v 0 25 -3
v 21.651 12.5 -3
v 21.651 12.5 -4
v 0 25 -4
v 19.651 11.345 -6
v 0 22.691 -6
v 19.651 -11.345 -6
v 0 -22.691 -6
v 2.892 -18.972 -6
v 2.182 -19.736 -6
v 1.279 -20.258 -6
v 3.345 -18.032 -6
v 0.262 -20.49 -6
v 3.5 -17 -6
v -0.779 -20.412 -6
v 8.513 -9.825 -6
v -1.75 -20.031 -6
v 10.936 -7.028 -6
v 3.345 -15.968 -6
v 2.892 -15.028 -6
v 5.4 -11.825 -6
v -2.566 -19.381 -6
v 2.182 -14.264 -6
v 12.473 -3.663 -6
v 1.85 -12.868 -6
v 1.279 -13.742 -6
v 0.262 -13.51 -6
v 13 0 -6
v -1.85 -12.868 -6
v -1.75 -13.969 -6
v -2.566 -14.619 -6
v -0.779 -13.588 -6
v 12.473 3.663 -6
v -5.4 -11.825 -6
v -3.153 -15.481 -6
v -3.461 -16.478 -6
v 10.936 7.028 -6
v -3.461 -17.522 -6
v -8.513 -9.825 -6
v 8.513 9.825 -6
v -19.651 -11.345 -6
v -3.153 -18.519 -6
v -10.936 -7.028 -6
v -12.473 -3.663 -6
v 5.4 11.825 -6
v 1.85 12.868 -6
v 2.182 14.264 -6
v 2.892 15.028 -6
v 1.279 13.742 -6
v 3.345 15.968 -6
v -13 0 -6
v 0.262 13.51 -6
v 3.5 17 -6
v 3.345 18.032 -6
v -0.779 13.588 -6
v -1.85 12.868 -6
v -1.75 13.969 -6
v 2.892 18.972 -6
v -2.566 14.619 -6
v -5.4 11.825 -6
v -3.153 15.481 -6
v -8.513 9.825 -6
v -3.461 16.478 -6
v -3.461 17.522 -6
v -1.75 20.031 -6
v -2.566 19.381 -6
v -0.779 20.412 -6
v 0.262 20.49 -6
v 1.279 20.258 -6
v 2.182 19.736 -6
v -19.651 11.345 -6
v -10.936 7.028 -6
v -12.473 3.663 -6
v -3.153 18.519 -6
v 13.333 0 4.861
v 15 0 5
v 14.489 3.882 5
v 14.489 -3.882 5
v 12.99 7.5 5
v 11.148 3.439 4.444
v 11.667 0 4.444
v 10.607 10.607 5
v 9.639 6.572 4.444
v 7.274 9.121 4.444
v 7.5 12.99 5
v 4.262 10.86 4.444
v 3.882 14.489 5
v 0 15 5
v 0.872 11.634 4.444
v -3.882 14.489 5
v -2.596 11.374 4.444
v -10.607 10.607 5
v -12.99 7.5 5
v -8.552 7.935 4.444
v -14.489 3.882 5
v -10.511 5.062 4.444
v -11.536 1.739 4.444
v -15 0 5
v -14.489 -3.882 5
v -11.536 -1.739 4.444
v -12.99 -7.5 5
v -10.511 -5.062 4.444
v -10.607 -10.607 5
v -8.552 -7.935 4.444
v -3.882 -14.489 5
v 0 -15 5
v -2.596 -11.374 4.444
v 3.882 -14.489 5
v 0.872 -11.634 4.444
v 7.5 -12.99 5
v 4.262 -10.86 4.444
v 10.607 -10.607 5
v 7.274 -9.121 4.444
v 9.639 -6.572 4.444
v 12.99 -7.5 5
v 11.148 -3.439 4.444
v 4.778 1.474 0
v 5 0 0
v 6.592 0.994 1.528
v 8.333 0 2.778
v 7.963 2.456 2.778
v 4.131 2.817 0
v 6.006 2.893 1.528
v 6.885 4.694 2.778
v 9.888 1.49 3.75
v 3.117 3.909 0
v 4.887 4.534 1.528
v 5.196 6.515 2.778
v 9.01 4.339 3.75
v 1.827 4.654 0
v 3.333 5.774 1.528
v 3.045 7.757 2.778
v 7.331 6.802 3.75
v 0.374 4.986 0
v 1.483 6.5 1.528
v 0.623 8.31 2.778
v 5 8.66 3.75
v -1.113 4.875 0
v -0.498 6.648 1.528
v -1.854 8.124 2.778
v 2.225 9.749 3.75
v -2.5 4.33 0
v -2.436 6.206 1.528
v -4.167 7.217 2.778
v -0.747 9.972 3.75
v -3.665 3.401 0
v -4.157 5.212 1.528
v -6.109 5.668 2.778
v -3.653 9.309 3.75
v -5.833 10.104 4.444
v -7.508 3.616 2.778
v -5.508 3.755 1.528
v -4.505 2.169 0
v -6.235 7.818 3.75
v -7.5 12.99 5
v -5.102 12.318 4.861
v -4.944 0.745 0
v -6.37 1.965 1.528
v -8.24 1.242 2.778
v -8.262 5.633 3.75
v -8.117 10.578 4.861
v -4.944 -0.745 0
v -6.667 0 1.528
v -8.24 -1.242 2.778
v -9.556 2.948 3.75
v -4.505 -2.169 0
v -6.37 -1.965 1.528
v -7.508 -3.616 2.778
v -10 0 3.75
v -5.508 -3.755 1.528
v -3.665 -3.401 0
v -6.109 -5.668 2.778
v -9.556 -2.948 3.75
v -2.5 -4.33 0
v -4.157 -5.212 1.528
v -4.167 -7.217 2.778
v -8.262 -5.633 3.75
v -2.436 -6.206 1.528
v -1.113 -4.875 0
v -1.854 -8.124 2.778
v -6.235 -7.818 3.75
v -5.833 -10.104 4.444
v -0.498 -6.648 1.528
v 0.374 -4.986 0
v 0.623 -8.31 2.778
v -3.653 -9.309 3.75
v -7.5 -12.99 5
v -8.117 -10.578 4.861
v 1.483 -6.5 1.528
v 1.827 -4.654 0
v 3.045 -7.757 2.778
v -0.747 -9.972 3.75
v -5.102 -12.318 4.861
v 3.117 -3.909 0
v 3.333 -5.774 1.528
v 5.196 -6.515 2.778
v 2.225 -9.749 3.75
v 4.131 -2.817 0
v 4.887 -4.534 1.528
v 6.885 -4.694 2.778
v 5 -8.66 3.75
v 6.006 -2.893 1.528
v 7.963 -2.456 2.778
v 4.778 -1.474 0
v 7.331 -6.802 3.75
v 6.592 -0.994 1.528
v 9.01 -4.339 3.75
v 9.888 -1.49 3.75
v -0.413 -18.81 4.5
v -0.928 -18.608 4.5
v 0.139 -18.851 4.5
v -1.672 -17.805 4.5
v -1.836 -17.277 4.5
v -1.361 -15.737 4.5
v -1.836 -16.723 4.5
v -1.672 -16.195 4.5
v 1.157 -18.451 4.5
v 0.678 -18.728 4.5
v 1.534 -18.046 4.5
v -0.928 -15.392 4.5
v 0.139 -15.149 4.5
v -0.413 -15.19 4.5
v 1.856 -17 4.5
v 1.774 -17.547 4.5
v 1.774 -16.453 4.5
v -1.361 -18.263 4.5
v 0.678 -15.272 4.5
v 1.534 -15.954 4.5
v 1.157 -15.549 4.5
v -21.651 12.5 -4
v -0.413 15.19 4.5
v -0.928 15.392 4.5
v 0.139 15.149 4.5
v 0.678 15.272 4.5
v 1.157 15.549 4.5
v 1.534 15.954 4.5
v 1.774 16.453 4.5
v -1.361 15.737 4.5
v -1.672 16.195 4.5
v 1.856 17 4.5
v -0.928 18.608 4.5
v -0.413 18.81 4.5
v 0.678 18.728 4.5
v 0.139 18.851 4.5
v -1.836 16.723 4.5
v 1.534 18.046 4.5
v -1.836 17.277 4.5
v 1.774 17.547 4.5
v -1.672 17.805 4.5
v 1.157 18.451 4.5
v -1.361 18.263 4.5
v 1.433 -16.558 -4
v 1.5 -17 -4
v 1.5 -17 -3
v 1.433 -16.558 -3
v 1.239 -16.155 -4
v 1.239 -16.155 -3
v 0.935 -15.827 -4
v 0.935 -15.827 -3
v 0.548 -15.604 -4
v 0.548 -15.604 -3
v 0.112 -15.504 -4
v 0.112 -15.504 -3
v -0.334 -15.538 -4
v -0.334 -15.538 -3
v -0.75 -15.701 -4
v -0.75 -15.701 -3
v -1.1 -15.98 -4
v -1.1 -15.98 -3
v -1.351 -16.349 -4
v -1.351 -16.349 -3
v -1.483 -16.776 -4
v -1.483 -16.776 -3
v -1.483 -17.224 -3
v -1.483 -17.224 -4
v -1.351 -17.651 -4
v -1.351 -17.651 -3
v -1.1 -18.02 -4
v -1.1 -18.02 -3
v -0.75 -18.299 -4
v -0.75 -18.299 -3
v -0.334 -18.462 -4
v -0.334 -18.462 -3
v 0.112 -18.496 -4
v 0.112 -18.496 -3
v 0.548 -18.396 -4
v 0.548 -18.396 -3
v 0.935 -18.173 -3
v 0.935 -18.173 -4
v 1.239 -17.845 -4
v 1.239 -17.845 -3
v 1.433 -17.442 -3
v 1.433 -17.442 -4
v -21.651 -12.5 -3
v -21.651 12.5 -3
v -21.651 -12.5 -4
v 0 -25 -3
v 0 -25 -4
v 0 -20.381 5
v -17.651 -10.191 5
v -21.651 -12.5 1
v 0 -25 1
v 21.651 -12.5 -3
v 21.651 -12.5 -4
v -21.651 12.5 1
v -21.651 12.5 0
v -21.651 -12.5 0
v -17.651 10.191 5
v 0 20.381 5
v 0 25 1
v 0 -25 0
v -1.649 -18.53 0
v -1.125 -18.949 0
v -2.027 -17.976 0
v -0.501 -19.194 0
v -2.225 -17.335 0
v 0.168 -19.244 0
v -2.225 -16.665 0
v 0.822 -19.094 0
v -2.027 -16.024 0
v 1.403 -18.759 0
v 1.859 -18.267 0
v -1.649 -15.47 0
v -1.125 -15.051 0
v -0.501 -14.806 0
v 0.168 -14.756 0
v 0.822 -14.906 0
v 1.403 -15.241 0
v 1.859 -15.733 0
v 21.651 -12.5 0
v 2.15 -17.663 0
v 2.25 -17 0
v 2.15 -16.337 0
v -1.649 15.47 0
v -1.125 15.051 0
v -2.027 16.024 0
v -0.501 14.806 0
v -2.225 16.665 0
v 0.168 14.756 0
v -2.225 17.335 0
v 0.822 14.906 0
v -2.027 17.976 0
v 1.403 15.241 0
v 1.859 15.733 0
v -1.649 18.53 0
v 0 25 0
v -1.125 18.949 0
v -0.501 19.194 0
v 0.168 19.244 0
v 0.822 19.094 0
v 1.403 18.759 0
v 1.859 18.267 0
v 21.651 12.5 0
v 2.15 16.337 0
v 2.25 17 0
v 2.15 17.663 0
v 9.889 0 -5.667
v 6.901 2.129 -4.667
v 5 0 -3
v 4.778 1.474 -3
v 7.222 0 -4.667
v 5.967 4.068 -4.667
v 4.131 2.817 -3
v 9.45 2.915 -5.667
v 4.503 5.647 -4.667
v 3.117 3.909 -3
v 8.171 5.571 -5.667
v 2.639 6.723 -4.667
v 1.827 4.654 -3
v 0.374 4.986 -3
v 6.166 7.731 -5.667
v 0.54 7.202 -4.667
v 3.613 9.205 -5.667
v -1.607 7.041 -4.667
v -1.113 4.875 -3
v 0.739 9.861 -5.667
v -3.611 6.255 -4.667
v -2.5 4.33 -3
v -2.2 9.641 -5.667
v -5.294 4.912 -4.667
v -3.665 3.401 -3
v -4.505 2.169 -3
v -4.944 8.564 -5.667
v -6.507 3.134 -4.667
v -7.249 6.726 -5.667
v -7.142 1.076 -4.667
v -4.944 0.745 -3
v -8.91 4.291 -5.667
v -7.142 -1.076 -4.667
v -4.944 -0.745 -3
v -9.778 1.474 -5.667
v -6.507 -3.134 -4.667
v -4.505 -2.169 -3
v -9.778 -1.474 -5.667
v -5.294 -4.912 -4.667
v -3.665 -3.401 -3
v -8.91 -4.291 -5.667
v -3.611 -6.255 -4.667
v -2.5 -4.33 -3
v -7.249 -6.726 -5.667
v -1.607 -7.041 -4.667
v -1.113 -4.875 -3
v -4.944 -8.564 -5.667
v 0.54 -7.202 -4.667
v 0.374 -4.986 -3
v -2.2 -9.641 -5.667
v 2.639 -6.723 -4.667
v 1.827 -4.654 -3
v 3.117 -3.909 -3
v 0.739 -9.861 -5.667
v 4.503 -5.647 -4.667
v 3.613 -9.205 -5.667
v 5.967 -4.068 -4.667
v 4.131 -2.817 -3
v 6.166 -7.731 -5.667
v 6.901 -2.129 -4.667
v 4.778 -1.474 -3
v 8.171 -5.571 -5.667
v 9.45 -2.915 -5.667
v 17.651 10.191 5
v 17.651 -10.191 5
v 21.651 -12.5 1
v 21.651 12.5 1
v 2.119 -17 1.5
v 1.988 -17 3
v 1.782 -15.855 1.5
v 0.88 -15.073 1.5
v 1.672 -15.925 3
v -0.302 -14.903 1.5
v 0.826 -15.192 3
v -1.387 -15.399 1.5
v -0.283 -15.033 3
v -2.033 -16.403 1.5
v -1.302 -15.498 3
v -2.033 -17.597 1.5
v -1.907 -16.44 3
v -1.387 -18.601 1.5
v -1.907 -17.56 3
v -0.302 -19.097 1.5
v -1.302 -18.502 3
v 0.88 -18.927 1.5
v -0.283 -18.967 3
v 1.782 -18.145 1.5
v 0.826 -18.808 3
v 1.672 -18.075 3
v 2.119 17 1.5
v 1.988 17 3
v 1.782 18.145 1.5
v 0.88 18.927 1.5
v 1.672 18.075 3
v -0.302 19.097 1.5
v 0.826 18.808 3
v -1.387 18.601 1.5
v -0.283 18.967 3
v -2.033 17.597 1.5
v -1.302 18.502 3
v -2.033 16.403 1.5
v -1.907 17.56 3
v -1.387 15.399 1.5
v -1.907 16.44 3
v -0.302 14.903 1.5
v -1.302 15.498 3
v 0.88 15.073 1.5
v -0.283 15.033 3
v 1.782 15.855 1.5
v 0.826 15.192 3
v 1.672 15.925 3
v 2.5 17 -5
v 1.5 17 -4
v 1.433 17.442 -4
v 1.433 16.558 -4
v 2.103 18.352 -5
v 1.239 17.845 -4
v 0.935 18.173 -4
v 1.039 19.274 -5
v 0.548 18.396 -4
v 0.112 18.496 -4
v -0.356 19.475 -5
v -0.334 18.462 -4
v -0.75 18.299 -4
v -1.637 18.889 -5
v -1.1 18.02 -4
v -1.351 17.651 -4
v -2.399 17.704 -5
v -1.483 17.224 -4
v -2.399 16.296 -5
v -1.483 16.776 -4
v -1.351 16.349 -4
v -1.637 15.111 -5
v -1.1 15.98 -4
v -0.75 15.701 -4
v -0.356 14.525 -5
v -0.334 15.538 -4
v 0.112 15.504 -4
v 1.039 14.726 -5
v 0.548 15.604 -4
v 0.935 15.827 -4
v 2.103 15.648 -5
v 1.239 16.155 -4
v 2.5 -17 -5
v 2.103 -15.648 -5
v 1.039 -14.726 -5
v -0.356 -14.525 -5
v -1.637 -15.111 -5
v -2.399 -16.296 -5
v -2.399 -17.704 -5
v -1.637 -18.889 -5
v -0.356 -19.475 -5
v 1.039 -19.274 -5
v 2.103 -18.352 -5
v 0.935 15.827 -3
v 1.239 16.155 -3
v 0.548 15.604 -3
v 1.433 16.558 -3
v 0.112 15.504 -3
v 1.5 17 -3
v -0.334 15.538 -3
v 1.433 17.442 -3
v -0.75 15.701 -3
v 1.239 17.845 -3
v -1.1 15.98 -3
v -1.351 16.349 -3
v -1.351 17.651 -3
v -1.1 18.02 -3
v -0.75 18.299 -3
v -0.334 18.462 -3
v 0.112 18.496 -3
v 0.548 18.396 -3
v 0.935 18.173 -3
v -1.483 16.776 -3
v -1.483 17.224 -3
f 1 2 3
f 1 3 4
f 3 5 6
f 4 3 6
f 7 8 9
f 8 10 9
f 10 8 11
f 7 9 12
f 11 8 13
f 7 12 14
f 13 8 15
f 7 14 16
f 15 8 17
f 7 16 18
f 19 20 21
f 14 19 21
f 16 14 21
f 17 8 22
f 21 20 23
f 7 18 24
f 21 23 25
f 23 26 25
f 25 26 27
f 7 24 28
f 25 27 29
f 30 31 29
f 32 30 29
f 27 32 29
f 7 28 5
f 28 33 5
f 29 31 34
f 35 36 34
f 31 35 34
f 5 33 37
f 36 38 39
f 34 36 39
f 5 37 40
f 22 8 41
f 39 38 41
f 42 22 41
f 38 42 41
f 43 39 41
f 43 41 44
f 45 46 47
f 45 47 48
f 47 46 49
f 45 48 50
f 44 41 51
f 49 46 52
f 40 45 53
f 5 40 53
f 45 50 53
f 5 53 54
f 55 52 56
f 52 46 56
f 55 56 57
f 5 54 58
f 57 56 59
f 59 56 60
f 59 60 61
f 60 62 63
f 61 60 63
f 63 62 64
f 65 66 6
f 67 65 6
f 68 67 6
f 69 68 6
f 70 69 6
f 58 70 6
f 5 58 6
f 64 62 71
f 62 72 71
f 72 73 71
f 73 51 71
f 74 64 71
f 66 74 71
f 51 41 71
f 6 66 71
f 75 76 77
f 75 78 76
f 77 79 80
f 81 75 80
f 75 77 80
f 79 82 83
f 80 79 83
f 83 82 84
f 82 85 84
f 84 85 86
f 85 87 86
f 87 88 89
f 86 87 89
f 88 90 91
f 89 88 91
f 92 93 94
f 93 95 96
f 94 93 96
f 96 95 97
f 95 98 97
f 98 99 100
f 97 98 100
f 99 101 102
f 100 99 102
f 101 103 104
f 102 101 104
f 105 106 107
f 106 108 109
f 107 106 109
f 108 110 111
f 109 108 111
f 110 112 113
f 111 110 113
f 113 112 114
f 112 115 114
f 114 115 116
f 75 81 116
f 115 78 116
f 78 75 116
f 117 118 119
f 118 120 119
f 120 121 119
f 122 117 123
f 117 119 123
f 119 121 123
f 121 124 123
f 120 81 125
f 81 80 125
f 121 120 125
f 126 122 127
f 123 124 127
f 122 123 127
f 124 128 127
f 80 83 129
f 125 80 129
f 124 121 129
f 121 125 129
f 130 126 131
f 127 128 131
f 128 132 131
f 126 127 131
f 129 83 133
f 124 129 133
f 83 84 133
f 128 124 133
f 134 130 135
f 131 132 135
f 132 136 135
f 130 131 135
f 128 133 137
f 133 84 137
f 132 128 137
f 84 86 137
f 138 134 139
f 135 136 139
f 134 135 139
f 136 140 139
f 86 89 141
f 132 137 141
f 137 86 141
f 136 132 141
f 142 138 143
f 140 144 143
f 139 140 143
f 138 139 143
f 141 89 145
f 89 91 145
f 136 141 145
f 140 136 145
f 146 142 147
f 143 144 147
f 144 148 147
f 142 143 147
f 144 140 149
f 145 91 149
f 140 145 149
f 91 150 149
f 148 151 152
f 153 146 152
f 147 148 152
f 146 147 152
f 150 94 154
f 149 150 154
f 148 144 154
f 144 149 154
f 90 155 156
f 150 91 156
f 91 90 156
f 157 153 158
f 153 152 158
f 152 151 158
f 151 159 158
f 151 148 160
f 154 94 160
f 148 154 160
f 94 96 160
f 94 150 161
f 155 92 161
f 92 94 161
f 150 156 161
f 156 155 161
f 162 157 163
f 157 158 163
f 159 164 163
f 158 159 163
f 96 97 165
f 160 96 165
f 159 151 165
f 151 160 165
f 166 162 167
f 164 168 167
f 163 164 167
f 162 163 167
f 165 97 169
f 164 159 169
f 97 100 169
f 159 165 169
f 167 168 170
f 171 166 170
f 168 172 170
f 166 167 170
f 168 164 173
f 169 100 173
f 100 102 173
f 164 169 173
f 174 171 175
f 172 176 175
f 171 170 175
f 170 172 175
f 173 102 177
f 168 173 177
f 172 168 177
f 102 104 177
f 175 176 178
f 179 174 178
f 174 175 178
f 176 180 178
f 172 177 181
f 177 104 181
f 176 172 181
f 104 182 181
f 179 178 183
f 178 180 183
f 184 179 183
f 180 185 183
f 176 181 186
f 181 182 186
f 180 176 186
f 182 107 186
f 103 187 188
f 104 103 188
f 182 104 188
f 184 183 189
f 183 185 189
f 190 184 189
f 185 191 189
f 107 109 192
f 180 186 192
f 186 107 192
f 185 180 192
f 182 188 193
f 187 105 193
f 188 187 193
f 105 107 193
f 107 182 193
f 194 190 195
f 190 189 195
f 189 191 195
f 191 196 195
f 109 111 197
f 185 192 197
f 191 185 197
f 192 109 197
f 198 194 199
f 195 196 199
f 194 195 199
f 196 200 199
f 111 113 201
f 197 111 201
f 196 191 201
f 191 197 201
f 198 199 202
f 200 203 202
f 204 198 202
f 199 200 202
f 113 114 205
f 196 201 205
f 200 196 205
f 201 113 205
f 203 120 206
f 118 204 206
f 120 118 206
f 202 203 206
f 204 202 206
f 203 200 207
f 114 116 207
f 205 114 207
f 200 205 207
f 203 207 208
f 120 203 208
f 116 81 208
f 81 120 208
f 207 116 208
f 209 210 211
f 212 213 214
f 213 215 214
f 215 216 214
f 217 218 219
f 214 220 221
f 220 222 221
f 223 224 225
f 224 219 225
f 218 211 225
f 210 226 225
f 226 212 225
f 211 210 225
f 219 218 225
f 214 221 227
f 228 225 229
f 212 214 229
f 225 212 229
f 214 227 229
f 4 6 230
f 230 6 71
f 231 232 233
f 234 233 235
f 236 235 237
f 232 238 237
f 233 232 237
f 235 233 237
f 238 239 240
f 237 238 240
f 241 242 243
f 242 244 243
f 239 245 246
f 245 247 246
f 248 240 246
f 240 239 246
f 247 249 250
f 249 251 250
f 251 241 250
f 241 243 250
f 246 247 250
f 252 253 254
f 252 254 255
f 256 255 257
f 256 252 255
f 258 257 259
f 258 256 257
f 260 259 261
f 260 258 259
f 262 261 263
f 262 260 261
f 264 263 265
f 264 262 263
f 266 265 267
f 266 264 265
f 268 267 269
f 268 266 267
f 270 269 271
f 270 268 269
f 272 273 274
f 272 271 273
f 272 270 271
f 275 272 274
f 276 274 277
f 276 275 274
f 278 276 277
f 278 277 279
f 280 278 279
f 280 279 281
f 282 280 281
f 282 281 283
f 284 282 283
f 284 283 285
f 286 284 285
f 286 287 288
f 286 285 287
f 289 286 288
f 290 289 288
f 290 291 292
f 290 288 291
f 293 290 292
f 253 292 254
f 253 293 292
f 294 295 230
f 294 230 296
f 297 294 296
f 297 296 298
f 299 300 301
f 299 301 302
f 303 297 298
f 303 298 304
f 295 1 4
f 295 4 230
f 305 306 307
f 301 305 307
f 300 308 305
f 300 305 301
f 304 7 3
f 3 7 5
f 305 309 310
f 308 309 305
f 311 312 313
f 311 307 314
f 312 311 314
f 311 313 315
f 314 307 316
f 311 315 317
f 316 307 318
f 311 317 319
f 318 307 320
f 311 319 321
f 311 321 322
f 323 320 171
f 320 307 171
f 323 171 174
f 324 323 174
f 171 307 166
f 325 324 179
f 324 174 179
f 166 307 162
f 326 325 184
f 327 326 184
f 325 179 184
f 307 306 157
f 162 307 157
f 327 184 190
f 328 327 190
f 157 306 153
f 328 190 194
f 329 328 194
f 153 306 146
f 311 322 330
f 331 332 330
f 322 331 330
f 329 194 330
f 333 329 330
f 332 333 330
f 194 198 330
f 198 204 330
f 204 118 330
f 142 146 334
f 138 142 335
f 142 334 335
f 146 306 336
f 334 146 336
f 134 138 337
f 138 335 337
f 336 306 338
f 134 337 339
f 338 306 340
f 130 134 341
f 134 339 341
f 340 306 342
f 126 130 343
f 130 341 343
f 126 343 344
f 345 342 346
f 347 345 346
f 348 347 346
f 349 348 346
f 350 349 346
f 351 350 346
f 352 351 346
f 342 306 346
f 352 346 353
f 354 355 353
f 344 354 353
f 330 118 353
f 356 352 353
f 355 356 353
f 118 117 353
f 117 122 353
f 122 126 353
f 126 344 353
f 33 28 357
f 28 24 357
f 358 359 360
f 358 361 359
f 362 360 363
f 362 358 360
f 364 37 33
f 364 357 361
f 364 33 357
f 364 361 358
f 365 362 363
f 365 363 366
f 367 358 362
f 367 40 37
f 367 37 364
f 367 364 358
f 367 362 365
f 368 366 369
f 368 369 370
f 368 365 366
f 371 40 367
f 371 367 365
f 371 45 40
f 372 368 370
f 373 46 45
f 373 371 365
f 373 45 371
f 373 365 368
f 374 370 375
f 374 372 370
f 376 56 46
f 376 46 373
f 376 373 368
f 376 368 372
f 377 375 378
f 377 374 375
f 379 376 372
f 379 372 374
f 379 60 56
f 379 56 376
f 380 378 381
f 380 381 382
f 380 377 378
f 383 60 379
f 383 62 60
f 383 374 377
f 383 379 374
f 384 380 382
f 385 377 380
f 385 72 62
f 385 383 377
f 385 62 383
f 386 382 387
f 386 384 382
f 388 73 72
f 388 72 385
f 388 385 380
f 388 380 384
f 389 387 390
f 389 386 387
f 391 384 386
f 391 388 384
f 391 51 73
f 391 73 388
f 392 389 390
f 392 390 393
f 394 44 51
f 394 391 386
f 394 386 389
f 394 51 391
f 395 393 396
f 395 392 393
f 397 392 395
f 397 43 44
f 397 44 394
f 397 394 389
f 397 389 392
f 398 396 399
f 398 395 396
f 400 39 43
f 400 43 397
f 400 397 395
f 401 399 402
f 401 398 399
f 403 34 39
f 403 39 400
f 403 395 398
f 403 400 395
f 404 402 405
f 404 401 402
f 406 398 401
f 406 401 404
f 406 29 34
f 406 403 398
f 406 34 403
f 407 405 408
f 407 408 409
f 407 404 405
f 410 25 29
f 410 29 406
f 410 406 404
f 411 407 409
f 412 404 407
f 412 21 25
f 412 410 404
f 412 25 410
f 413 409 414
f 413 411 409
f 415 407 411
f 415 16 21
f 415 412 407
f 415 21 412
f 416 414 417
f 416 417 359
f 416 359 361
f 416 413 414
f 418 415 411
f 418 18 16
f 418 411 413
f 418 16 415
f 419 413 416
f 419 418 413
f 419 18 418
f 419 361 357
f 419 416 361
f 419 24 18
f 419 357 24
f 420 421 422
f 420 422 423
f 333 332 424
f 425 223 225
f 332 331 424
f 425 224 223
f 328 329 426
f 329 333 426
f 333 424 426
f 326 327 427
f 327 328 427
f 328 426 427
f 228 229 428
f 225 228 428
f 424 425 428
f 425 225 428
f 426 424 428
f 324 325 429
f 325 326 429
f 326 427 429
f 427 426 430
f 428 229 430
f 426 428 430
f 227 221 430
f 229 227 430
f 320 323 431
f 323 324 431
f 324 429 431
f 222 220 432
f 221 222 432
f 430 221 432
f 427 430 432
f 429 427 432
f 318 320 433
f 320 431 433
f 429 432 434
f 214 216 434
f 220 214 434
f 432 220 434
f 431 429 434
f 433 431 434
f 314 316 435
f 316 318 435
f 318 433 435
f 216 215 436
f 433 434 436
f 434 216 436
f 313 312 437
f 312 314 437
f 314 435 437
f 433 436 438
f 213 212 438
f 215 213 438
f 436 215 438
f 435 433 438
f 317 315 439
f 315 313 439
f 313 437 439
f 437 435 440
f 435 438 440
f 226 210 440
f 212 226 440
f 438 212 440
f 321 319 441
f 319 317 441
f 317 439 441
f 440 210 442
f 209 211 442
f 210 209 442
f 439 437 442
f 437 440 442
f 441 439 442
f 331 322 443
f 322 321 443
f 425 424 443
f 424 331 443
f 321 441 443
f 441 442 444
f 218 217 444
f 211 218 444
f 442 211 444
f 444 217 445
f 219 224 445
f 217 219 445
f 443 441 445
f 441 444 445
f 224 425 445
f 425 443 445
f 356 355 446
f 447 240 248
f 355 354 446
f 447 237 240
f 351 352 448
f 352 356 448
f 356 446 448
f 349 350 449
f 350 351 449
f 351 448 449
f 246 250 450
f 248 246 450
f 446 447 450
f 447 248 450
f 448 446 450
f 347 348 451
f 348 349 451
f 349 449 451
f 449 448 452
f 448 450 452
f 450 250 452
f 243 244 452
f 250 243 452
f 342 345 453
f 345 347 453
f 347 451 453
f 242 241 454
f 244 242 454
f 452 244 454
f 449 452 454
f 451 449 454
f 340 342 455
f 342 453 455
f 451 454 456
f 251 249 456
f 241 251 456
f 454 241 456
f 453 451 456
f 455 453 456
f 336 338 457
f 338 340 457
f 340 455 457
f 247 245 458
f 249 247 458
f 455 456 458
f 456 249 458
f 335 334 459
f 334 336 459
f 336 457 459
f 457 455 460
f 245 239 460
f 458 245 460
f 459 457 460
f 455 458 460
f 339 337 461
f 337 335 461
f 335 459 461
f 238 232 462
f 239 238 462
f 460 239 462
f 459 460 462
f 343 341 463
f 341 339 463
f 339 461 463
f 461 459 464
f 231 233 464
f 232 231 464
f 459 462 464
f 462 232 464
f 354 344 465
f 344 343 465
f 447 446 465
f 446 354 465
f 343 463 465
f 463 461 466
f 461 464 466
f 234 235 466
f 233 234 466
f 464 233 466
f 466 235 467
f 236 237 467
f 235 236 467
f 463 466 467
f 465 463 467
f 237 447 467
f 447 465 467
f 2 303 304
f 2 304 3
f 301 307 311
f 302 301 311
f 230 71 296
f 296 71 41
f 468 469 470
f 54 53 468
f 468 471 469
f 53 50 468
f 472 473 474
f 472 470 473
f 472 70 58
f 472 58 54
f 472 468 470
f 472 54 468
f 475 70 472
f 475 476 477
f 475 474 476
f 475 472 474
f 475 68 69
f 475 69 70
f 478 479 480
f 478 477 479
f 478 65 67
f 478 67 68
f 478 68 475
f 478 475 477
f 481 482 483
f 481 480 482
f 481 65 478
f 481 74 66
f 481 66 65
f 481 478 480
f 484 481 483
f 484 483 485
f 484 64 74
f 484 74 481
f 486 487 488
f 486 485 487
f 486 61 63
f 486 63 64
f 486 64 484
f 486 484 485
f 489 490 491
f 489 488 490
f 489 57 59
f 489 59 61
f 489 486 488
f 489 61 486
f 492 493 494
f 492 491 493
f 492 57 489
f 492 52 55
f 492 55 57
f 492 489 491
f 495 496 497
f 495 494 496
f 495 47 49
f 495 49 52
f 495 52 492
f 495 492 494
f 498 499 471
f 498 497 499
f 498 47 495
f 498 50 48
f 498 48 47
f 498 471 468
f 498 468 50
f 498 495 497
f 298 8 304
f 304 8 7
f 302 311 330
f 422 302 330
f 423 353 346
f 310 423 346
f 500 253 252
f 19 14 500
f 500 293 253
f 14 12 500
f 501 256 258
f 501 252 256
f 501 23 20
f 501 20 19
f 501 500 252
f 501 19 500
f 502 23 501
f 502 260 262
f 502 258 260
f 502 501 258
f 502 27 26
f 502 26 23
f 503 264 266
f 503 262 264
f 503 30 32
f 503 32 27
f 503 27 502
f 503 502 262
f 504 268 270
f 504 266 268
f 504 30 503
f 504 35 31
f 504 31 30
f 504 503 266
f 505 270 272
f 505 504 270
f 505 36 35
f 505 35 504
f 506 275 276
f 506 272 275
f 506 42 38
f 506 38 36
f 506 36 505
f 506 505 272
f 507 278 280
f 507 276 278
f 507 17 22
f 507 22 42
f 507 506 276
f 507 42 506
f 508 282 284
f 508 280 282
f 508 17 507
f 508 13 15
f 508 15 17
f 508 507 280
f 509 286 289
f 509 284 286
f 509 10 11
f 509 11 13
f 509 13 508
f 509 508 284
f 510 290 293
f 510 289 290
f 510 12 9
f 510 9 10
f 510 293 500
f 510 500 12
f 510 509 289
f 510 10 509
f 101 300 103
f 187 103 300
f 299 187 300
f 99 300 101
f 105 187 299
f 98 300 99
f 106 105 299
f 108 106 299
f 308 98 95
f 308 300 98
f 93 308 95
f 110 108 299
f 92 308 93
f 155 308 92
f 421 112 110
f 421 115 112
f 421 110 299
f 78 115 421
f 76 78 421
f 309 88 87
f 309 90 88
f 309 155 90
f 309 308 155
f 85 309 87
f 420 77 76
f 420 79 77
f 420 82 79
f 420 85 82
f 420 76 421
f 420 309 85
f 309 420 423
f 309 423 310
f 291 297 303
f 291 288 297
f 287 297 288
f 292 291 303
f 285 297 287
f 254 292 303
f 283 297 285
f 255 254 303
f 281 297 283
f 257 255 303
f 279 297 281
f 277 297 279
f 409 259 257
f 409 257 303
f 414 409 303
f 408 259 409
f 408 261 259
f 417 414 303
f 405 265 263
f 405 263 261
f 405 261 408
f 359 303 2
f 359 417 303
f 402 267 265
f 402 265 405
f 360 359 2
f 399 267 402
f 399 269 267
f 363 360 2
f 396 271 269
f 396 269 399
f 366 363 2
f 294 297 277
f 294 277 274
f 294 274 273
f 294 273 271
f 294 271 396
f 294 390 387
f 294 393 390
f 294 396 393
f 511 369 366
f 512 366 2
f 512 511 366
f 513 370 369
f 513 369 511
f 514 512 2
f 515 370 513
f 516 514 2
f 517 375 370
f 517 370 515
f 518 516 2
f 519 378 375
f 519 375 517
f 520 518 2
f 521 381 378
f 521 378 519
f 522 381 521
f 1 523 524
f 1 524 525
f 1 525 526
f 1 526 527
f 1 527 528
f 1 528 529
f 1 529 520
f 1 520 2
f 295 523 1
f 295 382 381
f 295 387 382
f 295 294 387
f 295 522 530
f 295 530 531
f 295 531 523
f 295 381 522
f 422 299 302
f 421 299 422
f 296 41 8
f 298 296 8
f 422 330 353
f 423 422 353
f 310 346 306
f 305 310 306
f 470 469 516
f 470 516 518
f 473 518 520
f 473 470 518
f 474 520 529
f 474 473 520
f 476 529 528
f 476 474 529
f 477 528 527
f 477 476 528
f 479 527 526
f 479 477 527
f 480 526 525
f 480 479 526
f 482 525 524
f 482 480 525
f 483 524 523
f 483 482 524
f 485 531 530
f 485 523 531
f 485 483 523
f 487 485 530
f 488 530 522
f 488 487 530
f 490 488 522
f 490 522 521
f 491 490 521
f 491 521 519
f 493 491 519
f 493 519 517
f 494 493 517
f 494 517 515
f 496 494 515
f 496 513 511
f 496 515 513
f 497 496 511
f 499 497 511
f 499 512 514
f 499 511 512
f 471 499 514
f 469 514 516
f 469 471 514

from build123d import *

# Parameters (mm, degrees)
PAD_DEPTH       = 5
CHAMFER_SIZE    = 4
SKETCH002_R     = 2.25
POCKET_DEPTH    = 4.5
POCKET_TAPER    = 5
PAD001_DEPTH    = 3
CHAMFER001_SIZE = 2
SKETCH003_R     = 1.5
POCKET001_DEPTH = 100
POCKET001_TAPER = -45
POCKET002_DEPTH = 1.001


with BuildPart() as top:
    # Sketch → Pad (new body)
    with BuildSketch(Plane.XY):
        Polygon((0, -25), (21.650635, -12.5), (21.650635, 12.5), (0, 25), (-21.650635, 12.5), (-21.650635, -12.5), align=None)
    extrude(amount=PAD_DEPTH)

    # Chamfer
    chamfer_edges = [top.edges().sort_by_distance(p)[0] for p in [
        (-10.825318, 18.75, 5),
        (-21.650635, 0, 5),
        (-10.825318, -18.75, 5),
        (10.825318, -18.75, 5),
        (21.650635, 0, 5),
        (10.825318, 18.75, 5),
    ]]
    chamfer(chamfer_edges, length=CHAMFER_SIZE)

    # Sketch001 → Groove (revolve, cut)
    with BuildSketch(Plane.XZ):
        with BuildLine():
            Line((0, 5), (0, 0))
            Line((0, 0), (5, 0))
            add(Edge.make_bspline(
                [(5, 0), (10, 5), (15, 5)],
                knots=[0, 0, 0, 1, 1, 1], degree=2))
            Line((15, 5), (0, 5))
        make_face()
    revolve(axis=Axis((0, 0, 0), (0, 0, 1)), mode=Mode.SUBTRACT)

    # Sketch002 → Pocket (cut)
    with BuildSketch(Plane.XY):
        with Locations((0, 17)):
            Circle(SKETCH002_R)
        with Locations((0, -17)):
            Circle(SKETCH002_R)
    extrude(amount=POCKET_DEPTH, taper=POCKET_TAPER, mode=Mode.SUBTRACT)


with BuildPart() as bottom:
    # Binder → Pad001 (new body)
    with BuildSketch(Plane(origin=(0, 0, -3), x_dir=(0, 1, 0), z_dir=(0, 0, 1))):
        Polygon((-25, 0), (-12.5, -21.650635), (12.5, -21.650635), (25, 0), (12.5, 21.650635), (-12.5, 21.650635), align=None)
    extrude(amount=-PAD001_DEPTH)

    # Chamfer001
    chamfer001_edges = [bottom.edges().sort_by_distance(p)[0] for p in [
        (10.825318, -18.75, -6),
        (21.650635, 0, -6),
        (10.825318, 18.75, -6),
        (-10.825318, 18.75, -6),
        (-21.650635, 0, -6),
        (-10.825318, -18.75, -6),
    ]]
    chamfer(chamfer001_edges, length=CHAMFER001_SIZE)

    # Sketch003 (on Binder) → Pocket001 (cut)
    with BuildSketch(Plane.XY.offset(-4)):
        with Locations((0, 17)):
            Circle(SKETCH003_R)
        with Locations((0, -17)):
            Circle(SKETCH003_R)
    extrude(amount=-POCKET001_DEPTH, taper=POCKET001_TAPER, mode=Mode.SUBTRACT)

    # Sketch003 (on Binder) → Pocket002 (cut, through all)
    with BuildSketch(Plane.XY.offset(-4)):
        with Locations((0, 17)):
            Circle(SKETCH003_R)
        with Locations((0, -17)):
            Circle(SKETCH003_R)
    extrude(amount=POCKET002_DEPTH, mode=Mode.SUBTRACT)

    # Sketch004 (on Binder) → Groove001 (revolve, cut)
    with BuildSketch(Plane(origin=(0, 0, -3), x_dir=(1, 0, 0), z_dir=(0, -1, 0))):
        with BuildLine():
            Line((0, -3), (0, 0))
            Line((0, 0), (5, 0))
            add(Edge.make_bspline(
                [(5, 0), (8, -3), (13, -3)],
                knots=[0, 0, 0, 1, 1, 1], degree=2))
            Line((13, -3), (0, -3))
        make_face()
    revolve(axis=Axis((0, 0, -3), (0, 0, 1)), mode=Mode.SUBTRACT)


solid = Compound([top.part, bottom.part])
